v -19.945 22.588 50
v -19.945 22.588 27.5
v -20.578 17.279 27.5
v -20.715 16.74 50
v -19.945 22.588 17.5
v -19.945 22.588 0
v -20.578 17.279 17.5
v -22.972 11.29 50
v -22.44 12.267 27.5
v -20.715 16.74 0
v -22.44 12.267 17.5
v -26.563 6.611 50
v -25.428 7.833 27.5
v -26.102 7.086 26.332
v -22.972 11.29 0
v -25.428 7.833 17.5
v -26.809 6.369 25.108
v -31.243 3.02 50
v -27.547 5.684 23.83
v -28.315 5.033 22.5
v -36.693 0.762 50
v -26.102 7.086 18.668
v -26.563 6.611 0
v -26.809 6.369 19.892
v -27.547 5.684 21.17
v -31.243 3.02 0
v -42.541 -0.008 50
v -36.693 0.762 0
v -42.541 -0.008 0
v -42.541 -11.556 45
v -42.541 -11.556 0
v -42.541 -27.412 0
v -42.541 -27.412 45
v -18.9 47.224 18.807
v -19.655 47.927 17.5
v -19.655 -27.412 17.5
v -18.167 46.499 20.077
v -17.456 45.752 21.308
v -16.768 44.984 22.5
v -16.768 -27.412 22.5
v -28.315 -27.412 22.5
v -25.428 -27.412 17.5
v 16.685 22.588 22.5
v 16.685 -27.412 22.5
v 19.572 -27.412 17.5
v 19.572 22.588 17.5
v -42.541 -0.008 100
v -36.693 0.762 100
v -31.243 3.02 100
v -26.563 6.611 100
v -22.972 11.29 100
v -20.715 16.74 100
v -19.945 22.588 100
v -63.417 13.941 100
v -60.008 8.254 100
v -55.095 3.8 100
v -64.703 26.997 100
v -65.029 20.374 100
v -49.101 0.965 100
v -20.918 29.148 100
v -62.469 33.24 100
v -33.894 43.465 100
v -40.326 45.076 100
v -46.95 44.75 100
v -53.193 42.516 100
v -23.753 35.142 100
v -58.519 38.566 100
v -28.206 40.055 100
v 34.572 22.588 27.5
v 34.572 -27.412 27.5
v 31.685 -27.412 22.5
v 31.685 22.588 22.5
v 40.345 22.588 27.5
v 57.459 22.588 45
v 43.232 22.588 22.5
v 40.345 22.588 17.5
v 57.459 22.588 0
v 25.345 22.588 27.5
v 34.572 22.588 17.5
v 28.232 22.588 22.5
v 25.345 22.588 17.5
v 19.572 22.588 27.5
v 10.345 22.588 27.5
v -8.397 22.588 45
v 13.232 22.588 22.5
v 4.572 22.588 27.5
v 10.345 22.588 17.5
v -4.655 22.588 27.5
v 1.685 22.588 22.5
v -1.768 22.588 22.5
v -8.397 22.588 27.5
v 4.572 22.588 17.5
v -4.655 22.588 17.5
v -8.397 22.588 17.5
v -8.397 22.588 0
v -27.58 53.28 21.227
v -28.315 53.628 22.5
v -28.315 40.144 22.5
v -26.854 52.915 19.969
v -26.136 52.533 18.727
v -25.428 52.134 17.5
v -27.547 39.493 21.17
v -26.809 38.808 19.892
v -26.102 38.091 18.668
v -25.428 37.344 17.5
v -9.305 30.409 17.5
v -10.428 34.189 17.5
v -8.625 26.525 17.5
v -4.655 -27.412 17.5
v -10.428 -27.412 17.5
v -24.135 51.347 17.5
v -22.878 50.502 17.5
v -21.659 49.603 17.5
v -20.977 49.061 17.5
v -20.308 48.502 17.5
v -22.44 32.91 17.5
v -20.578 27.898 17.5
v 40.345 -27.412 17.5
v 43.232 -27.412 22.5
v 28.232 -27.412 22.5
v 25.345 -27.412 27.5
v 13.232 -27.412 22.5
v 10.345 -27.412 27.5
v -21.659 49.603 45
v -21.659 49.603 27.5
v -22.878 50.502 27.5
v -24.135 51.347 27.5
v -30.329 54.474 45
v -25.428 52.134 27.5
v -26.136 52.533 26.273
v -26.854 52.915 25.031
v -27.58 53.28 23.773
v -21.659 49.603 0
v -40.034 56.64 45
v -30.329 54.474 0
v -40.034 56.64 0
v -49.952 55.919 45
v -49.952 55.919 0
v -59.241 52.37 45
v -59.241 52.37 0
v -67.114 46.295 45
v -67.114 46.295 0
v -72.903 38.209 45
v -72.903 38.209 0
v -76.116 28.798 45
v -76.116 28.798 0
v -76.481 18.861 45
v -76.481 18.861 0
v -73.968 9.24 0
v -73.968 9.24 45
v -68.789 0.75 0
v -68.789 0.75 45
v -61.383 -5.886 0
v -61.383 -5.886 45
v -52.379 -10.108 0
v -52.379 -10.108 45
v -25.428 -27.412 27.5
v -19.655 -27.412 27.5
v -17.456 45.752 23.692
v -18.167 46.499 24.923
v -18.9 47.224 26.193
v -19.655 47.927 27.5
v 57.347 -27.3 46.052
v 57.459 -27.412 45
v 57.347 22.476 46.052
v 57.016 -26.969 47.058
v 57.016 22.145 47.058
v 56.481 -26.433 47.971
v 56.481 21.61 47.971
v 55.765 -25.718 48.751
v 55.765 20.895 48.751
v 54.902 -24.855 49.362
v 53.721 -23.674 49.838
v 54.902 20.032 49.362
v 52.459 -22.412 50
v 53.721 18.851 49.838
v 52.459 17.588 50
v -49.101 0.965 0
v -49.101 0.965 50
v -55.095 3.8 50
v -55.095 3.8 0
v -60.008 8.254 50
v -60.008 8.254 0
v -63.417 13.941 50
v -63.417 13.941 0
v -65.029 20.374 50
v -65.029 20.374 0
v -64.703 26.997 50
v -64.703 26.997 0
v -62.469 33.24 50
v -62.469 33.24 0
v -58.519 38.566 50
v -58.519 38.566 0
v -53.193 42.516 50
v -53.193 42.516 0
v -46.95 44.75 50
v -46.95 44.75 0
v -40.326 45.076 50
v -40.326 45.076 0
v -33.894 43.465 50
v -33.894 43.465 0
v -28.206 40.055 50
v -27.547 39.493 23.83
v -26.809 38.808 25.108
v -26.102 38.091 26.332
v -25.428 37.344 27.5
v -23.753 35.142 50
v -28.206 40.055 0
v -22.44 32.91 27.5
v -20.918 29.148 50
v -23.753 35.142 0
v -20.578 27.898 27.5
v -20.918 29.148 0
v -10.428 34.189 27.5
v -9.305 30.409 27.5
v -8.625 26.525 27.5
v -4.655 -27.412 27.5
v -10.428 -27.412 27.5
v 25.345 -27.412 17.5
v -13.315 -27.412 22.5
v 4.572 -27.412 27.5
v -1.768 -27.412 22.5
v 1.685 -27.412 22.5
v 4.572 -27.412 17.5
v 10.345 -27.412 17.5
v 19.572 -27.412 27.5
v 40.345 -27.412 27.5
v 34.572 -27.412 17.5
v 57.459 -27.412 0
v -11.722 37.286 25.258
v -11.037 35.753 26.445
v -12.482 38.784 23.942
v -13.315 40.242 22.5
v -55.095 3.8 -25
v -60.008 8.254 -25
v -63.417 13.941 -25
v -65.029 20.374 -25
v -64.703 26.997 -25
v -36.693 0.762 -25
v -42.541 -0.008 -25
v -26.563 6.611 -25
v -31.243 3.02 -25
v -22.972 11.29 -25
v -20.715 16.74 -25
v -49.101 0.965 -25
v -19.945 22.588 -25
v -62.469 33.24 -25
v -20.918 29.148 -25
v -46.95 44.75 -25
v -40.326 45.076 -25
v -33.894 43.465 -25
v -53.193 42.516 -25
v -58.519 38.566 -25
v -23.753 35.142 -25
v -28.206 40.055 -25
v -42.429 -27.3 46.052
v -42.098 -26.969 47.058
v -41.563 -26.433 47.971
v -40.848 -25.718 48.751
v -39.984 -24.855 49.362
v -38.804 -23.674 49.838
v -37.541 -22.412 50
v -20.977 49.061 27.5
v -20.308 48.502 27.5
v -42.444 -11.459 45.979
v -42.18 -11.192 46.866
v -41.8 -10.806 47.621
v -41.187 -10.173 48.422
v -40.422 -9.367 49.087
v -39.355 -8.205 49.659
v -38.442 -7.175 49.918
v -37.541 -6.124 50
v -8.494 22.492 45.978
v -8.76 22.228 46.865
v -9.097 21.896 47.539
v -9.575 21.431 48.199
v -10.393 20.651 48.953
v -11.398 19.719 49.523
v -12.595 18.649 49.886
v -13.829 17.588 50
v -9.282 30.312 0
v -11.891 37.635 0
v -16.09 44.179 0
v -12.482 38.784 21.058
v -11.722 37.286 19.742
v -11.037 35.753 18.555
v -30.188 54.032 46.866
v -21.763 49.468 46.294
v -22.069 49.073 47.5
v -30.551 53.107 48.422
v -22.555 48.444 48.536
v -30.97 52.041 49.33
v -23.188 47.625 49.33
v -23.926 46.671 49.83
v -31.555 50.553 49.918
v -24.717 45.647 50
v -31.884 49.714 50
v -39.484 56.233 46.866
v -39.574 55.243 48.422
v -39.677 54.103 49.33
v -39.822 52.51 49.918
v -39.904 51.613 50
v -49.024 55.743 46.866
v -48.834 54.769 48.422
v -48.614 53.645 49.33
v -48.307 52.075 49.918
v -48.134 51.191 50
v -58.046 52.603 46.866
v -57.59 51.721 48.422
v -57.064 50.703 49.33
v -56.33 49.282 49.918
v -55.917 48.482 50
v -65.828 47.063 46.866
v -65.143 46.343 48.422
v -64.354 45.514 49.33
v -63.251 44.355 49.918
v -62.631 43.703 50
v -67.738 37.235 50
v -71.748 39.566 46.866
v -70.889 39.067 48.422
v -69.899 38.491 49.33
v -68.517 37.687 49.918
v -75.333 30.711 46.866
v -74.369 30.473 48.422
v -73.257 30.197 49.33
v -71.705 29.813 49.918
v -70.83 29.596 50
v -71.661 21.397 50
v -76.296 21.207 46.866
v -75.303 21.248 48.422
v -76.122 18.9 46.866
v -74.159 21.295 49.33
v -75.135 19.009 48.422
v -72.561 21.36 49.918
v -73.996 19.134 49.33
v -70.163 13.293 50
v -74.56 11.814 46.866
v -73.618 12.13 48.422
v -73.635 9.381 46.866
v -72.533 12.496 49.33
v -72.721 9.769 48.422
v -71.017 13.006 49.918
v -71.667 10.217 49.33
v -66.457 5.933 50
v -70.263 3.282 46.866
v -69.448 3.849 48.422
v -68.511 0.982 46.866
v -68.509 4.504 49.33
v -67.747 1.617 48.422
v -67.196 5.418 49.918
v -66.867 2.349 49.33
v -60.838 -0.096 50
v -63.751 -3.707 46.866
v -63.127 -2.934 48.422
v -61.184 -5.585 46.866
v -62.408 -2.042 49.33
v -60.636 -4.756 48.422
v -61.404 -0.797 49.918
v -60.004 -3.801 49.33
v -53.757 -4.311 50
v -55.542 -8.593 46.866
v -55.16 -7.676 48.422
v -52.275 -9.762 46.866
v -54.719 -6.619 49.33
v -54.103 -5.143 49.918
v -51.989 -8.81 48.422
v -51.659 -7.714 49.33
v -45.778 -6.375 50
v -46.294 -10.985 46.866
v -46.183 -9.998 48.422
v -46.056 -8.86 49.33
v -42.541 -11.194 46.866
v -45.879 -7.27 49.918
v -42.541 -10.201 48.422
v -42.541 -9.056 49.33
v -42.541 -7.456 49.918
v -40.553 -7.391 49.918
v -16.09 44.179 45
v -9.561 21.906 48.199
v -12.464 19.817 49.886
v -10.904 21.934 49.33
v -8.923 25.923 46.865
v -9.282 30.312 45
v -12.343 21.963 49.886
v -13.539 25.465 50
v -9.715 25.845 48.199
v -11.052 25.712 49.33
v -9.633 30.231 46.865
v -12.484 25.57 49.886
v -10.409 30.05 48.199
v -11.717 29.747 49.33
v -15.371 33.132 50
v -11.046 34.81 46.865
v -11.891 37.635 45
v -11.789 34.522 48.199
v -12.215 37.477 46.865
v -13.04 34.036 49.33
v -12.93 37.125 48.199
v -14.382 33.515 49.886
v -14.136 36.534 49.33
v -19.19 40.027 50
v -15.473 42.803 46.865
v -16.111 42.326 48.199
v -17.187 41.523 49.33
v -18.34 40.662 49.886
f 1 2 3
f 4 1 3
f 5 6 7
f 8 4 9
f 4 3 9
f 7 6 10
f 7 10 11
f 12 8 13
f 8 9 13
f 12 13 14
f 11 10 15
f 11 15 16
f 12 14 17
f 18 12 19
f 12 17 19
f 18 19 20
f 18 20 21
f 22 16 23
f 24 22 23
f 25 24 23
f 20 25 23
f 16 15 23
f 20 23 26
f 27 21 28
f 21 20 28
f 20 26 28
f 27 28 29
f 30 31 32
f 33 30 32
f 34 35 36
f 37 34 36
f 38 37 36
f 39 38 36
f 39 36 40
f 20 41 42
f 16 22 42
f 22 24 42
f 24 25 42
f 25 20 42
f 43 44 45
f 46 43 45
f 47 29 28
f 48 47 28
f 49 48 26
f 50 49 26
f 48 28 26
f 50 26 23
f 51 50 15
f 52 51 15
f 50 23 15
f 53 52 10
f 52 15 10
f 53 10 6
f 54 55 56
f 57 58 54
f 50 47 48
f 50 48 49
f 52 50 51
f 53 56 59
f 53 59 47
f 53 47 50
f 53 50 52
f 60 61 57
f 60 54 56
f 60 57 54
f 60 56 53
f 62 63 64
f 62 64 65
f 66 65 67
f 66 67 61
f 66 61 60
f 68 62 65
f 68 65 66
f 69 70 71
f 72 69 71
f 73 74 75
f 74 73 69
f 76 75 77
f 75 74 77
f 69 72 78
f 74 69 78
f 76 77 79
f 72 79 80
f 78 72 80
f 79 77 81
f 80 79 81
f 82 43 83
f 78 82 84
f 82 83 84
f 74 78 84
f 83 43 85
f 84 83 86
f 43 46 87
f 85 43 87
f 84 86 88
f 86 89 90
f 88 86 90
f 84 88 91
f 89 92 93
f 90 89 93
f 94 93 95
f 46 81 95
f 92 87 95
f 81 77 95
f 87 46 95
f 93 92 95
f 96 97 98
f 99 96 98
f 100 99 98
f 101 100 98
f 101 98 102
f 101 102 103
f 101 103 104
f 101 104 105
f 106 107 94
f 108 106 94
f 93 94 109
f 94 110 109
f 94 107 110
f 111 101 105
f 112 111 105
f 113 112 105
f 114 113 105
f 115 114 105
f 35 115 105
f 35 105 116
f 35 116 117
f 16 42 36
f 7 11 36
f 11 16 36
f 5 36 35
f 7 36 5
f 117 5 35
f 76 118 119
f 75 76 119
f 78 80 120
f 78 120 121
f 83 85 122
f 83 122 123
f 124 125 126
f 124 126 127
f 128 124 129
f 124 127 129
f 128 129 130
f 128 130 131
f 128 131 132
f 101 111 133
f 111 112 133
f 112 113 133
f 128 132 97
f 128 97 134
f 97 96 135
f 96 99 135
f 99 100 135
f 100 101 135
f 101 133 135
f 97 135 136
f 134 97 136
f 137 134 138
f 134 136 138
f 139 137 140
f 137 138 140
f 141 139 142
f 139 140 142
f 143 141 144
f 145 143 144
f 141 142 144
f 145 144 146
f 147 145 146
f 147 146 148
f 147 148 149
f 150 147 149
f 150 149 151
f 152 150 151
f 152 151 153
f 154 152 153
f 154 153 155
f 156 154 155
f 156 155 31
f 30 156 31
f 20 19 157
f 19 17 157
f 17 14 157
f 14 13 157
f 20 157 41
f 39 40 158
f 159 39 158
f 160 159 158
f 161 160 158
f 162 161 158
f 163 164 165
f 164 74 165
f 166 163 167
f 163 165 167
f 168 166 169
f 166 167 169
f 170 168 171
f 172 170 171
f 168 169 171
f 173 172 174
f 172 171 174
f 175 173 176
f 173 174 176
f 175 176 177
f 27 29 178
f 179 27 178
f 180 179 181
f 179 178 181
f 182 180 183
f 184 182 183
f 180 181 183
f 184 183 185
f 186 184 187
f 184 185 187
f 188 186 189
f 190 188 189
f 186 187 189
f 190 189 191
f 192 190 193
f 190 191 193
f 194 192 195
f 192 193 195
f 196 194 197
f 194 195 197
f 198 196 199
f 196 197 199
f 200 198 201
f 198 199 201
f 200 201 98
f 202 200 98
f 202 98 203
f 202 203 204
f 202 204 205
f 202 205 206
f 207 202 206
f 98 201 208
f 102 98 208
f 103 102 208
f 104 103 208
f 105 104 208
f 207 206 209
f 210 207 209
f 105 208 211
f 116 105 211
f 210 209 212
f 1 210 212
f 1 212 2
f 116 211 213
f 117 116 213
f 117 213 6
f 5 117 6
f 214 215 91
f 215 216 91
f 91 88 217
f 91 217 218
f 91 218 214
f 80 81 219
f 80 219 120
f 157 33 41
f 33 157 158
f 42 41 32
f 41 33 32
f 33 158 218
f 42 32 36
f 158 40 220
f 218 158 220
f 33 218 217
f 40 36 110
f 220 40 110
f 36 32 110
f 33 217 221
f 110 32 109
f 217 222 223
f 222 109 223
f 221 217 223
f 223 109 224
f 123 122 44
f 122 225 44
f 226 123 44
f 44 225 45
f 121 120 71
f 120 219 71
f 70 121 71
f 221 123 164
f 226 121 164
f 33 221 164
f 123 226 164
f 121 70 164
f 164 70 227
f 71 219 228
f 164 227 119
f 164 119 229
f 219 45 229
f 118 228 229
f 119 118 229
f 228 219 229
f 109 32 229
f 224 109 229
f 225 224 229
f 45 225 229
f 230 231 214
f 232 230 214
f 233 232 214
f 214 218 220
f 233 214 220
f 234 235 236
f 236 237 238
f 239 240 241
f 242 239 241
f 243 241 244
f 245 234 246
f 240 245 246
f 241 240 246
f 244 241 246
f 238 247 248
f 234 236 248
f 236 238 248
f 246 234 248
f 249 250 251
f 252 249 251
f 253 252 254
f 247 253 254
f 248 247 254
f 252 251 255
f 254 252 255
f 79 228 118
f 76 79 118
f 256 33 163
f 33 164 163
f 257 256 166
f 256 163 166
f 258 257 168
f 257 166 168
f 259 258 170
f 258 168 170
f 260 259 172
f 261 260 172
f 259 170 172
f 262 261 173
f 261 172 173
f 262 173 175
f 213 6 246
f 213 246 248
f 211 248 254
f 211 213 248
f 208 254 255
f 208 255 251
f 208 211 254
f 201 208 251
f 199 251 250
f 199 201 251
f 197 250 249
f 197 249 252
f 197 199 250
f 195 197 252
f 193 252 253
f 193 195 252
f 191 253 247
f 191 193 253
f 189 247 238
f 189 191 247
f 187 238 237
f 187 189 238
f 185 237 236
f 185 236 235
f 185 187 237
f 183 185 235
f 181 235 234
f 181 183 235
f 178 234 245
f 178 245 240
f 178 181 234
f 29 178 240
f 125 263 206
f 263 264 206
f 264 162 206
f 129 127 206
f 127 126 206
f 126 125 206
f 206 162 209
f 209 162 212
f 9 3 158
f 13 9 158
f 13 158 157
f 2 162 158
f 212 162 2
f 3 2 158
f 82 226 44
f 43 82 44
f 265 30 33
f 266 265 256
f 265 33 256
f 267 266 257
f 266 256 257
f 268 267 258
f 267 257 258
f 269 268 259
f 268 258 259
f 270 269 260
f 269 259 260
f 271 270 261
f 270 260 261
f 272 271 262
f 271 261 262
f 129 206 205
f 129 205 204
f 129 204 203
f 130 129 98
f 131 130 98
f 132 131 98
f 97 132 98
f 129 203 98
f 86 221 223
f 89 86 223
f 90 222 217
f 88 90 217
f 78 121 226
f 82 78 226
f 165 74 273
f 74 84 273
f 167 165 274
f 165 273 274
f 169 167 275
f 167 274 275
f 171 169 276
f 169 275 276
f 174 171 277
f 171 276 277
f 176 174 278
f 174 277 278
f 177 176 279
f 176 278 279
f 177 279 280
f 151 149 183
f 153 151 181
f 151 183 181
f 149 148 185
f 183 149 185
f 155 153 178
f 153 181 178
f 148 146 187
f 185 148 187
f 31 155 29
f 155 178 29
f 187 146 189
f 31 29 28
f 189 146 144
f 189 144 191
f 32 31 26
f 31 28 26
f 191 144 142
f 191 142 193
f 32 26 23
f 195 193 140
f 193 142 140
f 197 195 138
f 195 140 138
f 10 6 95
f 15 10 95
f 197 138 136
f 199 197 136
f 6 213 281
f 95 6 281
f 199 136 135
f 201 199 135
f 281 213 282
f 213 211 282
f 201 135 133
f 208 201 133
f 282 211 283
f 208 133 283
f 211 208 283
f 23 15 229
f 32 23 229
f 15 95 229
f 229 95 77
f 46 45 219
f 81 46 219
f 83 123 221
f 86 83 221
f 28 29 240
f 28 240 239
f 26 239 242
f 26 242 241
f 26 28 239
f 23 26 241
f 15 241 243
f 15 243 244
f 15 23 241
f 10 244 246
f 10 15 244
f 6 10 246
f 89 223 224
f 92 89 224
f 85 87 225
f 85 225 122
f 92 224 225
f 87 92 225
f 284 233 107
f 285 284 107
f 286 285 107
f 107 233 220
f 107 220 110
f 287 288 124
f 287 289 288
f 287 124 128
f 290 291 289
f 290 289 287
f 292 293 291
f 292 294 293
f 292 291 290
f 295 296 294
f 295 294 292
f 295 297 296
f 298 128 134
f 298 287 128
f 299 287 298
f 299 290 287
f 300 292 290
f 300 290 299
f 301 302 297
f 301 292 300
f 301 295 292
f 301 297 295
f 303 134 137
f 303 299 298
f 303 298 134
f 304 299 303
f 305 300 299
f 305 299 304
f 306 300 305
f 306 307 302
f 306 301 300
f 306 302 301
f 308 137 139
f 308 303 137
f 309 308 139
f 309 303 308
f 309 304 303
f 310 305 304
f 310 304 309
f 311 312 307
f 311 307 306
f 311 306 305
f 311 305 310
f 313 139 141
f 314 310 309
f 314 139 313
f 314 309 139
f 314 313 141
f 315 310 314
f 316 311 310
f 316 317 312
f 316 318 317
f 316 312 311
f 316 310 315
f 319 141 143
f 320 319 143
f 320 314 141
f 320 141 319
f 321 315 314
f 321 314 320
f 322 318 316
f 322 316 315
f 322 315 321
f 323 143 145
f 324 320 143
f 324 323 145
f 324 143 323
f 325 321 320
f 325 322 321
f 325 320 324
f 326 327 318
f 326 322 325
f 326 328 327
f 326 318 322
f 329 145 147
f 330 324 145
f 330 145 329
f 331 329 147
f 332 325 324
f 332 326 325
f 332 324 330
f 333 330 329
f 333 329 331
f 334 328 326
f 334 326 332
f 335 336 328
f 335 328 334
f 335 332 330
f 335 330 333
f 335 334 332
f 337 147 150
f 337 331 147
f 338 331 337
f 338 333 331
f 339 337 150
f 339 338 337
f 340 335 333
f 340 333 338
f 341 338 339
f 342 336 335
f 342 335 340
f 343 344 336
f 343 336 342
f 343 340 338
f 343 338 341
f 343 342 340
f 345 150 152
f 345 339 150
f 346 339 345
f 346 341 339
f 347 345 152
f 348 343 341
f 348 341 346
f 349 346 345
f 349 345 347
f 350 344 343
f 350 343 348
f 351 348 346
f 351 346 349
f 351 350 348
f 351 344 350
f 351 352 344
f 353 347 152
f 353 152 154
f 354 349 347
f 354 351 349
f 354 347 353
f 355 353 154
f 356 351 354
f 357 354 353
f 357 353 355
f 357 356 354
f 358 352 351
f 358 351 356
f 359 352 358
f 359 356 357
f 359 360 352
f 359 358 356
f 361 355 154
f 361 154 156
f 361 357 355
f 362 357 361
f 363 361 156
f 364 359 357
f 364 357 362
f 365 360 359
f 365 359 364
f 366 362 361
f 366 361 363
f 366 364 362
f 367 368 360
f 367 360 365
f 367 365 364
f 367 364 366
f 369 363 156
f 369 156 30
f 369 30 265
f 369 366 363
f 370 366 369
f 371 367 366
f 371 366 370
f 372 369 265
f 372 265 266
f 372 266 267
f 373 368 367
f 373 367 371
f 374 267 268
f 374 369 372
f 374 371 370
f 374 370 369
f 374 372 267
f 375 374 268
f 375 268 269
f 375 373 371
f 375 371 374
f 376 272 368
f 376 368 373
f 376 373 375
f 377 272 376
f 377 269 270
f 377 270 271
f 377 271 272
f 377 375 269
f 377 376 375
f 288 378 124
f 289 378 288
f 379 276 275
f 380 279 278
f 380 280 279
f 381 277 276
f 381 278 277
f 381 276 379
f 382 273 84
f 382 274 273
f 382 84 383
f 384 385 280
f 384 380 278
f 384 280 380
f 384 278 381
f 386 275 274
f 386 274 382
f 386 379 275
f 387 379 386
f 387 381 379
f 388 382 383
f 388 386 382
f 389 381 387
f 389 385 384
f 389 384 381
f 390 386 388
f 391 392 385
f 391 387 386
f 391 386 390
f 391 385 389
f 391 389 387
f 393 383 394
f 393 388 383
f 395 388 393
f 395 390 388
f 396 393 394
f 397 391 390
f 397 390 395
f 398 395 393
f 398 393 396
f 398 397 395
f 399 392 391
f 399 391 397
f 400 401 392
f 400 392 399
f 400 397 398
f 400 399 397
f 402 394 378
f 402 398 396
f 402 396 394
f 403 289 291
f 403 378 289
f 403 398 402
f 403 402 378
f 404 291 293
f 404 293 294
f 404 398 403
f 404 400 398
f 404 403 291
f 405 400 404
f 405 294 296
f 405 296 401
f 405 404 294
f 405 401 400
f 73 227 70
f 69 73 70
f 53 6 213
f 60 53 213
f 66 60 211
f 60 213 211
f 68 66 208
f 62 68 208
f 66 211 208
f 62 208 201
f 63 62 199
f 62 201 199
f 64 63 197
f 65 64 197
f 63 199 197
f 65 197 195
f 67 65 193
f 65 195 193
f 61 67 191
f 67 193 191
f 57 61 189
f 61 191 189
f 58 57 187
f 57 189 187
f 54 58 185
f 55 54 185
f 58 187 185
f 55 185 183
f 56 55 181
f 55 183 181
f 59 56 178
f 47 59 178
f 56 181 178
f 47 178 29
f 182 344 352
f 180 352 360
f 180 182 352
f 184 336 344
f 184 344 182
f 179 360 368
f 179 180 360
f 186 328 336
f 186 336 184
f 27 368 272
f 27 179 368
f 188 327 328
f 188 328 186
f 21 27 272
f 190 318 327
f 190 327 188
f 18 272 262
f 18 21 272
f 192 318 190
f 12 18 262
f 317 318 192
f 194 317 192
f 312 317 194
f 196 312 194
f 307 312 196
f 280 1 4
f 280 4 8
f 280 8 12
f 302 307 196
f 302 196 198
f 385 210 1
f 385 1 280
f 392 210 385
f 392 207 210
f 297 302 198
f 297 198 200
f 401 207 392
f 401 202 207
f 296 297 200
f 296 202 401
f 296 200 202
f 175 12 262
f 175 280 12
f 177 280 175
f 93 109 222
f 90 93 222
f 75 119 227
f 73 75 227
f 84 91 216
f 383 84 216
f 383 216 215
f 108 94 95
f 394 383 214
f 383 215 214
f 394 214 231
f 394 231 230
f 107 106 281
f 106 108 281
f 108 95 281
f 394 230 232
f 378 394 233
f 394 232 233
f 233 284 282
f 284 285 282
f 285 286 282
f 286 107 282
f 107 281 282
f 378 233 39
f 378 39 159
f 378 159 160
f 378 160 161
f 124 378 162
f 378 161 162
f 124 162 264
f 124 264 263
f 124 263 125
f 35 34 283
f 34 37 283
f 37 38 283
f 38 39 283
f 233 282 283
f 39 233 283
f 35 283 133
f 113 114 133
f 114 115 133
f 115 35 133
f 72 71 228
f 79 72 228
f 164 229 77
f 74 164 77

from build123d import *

# Parameters (mm, degrees)
F1_DEPTH      = 50
F2_DEPTH      = 100
F2_DEPTH_BACK = 25
F3_R          = 5
F5_DEPTH      = 84.1452189972


with BuildPart() as f1:
    # F0 (on Top) → F1 (new body)
    with BuildSketch(Plane.XY):
        with BuildLine():
            ThreePointArc((-42.5412729383, -0.0076430535), (-58.519124099, 38.5663019163), (-19.9451791292, 22.5884507556))
            Line((-19.9451791292, 22.5884507556), (-8.397054041, 22.5884507556))
            ThreePointArc((-8.397054041, 22.5884507556), (-11.8913995751, 37.6354752761), (-21.6592081763, 49.6026517502))
            ThreePointArc((-21.6592081763, 49.6026517502), (-74.853859311, 33.621330978), (-42.5412729383, -11.5557681416))
            Line((-42.5412729383, -11.5557681416), (-42.5412729383, -0.0076430535))
        make_face()
        with BuildLine():
            Line((57.4587270617, 22.5884507556), (-8.397054041, 22.5884507556))
            ThreePointArc((-8.397054041, 22.5884507556), (-18.3976642177, -1.555157965), (-42.5412729383, -11.5557681416))
            Line((-42.5412729383, -11.5557681416), (-42.5412729383, -27.4115492444))
            Line((-42.5412729383, -27.4115492444), (57.4587270617, -27.4115492444))
            Line((57.4587270617, -27.4115492444), (57.4587270617, 22.5884507556))
        make_face()
        with BuildLine():
            Line((-8.397054041, 22.5884507556), (-19.9451791292, 22.5884507556))
            ThreePointArc((-19.9451791292, 22.5884507556), (-26.5634217775, 6.6105995948), (-42.5412729383, -0.0076430535))
            Line((-42.5412729383, -0.0076430535), (-42.5412729383, -11.5557681416))
            ThreePointArc((-42.5412729383, -11.5557681416), (-18.3976642177, -1.555157965), (-8.397054041, 22.5884507556))
        make_face()
    extrude(amount=F1_DEPTH)

    # F3
    f3_edges = [f1.edges().sort_by_distance(p)[0] for p in [
        (7.458727, -27.411549, 50),
        (-42.541273, -19.483659, 50),
        (-66.684882, 46.732059, 50),
        (24.530837, 22.588451, 50),
        (57.458727, -2.411549, 50),
    ]]
    fillet(f3_edges, radius=F3_R)

    # F4 (on face) → F5 (cut, through all)
    with BuildSketch(Plane.XZ.offset(27.4115492444)):
        Polygon((-19.6545215923, 17.5), (-16.7677702464, 22.5), (-19.6545215923, 27.5), (-25.4280242842, 27.5), (-28.3147756301, 22.5), (-25.4280242842, 17.5), align=None)
        Polygon((-4.6545215923, 27.5), (-10.4280242842, 27.5), (-13.3147756301, 22.5), (-10.4280242842, 17.5), (-4.6545215923, 17.5), (-1.7677702464, 22.5), align=None)
        Polygon((10.3454784077, 27.5), (4.5719757158, 27.5), (1.6852243699, 22.5), (4.5719757158, 17.5), (10.3454784077, 17.5), (13.2322297536, 22.5), align=None)
        Polygon((25.3454784077, 27.5), (19.5719757158, 27.5), (16.6852243699, 22.5), (19.5719757158, 17.5), (25.3454784077, 17.5), (28.2322297536, 22.5), align=None)
        Polygon((40.3454784077, 27.5), (34.5719757158, 27.5), (31.6852243699, 22.5), (34.5719757158, 17.5), (40.3454784077, 17.5), (43.2322297536, 22.5), align=None)
    extrude(amount=-F5_DEPTH, mode=Mode.SUBTRACT)


with BuildPart() as f2:
    # F0 (on Top) → F2 (new body, two sides)
    with BuildSketch(Plane.XY) as f2_sk:
        with BuildLine():
            Line((-42.5412729383, -0.0076430535), (-42.5412729383, 22.5884507556))
            Line((-42.5412729383, 22.5884507556), (-19.9451791292, 22.5884507556))
            ThreePointArc((-19.9451791292, 22.5884507556), (-58.519124099, 38.5663019163), (-42.5412729383, -0.0076430535))
        make_face()
        with BuildLine():
            Line((-19.9451791292, 22.5884507556), (-42.5412729383, 22.5884507556))
            Line((-42.5412729383, 22.5884507556), (-42.5412729383, -0.0076430535))
            ThreePointArc((-42.5412729383, -0.0076430535), (-26.5634217775, 6.6105995948), (-19.9451791292, 22.5884507556))
        make_face()
    extrude(amount=F2_DEPTH)
    extrude(f2_sk.sketch, amount=-F2_DEPTH_BACK)


solid = Compound([f1.part, f2.part])
